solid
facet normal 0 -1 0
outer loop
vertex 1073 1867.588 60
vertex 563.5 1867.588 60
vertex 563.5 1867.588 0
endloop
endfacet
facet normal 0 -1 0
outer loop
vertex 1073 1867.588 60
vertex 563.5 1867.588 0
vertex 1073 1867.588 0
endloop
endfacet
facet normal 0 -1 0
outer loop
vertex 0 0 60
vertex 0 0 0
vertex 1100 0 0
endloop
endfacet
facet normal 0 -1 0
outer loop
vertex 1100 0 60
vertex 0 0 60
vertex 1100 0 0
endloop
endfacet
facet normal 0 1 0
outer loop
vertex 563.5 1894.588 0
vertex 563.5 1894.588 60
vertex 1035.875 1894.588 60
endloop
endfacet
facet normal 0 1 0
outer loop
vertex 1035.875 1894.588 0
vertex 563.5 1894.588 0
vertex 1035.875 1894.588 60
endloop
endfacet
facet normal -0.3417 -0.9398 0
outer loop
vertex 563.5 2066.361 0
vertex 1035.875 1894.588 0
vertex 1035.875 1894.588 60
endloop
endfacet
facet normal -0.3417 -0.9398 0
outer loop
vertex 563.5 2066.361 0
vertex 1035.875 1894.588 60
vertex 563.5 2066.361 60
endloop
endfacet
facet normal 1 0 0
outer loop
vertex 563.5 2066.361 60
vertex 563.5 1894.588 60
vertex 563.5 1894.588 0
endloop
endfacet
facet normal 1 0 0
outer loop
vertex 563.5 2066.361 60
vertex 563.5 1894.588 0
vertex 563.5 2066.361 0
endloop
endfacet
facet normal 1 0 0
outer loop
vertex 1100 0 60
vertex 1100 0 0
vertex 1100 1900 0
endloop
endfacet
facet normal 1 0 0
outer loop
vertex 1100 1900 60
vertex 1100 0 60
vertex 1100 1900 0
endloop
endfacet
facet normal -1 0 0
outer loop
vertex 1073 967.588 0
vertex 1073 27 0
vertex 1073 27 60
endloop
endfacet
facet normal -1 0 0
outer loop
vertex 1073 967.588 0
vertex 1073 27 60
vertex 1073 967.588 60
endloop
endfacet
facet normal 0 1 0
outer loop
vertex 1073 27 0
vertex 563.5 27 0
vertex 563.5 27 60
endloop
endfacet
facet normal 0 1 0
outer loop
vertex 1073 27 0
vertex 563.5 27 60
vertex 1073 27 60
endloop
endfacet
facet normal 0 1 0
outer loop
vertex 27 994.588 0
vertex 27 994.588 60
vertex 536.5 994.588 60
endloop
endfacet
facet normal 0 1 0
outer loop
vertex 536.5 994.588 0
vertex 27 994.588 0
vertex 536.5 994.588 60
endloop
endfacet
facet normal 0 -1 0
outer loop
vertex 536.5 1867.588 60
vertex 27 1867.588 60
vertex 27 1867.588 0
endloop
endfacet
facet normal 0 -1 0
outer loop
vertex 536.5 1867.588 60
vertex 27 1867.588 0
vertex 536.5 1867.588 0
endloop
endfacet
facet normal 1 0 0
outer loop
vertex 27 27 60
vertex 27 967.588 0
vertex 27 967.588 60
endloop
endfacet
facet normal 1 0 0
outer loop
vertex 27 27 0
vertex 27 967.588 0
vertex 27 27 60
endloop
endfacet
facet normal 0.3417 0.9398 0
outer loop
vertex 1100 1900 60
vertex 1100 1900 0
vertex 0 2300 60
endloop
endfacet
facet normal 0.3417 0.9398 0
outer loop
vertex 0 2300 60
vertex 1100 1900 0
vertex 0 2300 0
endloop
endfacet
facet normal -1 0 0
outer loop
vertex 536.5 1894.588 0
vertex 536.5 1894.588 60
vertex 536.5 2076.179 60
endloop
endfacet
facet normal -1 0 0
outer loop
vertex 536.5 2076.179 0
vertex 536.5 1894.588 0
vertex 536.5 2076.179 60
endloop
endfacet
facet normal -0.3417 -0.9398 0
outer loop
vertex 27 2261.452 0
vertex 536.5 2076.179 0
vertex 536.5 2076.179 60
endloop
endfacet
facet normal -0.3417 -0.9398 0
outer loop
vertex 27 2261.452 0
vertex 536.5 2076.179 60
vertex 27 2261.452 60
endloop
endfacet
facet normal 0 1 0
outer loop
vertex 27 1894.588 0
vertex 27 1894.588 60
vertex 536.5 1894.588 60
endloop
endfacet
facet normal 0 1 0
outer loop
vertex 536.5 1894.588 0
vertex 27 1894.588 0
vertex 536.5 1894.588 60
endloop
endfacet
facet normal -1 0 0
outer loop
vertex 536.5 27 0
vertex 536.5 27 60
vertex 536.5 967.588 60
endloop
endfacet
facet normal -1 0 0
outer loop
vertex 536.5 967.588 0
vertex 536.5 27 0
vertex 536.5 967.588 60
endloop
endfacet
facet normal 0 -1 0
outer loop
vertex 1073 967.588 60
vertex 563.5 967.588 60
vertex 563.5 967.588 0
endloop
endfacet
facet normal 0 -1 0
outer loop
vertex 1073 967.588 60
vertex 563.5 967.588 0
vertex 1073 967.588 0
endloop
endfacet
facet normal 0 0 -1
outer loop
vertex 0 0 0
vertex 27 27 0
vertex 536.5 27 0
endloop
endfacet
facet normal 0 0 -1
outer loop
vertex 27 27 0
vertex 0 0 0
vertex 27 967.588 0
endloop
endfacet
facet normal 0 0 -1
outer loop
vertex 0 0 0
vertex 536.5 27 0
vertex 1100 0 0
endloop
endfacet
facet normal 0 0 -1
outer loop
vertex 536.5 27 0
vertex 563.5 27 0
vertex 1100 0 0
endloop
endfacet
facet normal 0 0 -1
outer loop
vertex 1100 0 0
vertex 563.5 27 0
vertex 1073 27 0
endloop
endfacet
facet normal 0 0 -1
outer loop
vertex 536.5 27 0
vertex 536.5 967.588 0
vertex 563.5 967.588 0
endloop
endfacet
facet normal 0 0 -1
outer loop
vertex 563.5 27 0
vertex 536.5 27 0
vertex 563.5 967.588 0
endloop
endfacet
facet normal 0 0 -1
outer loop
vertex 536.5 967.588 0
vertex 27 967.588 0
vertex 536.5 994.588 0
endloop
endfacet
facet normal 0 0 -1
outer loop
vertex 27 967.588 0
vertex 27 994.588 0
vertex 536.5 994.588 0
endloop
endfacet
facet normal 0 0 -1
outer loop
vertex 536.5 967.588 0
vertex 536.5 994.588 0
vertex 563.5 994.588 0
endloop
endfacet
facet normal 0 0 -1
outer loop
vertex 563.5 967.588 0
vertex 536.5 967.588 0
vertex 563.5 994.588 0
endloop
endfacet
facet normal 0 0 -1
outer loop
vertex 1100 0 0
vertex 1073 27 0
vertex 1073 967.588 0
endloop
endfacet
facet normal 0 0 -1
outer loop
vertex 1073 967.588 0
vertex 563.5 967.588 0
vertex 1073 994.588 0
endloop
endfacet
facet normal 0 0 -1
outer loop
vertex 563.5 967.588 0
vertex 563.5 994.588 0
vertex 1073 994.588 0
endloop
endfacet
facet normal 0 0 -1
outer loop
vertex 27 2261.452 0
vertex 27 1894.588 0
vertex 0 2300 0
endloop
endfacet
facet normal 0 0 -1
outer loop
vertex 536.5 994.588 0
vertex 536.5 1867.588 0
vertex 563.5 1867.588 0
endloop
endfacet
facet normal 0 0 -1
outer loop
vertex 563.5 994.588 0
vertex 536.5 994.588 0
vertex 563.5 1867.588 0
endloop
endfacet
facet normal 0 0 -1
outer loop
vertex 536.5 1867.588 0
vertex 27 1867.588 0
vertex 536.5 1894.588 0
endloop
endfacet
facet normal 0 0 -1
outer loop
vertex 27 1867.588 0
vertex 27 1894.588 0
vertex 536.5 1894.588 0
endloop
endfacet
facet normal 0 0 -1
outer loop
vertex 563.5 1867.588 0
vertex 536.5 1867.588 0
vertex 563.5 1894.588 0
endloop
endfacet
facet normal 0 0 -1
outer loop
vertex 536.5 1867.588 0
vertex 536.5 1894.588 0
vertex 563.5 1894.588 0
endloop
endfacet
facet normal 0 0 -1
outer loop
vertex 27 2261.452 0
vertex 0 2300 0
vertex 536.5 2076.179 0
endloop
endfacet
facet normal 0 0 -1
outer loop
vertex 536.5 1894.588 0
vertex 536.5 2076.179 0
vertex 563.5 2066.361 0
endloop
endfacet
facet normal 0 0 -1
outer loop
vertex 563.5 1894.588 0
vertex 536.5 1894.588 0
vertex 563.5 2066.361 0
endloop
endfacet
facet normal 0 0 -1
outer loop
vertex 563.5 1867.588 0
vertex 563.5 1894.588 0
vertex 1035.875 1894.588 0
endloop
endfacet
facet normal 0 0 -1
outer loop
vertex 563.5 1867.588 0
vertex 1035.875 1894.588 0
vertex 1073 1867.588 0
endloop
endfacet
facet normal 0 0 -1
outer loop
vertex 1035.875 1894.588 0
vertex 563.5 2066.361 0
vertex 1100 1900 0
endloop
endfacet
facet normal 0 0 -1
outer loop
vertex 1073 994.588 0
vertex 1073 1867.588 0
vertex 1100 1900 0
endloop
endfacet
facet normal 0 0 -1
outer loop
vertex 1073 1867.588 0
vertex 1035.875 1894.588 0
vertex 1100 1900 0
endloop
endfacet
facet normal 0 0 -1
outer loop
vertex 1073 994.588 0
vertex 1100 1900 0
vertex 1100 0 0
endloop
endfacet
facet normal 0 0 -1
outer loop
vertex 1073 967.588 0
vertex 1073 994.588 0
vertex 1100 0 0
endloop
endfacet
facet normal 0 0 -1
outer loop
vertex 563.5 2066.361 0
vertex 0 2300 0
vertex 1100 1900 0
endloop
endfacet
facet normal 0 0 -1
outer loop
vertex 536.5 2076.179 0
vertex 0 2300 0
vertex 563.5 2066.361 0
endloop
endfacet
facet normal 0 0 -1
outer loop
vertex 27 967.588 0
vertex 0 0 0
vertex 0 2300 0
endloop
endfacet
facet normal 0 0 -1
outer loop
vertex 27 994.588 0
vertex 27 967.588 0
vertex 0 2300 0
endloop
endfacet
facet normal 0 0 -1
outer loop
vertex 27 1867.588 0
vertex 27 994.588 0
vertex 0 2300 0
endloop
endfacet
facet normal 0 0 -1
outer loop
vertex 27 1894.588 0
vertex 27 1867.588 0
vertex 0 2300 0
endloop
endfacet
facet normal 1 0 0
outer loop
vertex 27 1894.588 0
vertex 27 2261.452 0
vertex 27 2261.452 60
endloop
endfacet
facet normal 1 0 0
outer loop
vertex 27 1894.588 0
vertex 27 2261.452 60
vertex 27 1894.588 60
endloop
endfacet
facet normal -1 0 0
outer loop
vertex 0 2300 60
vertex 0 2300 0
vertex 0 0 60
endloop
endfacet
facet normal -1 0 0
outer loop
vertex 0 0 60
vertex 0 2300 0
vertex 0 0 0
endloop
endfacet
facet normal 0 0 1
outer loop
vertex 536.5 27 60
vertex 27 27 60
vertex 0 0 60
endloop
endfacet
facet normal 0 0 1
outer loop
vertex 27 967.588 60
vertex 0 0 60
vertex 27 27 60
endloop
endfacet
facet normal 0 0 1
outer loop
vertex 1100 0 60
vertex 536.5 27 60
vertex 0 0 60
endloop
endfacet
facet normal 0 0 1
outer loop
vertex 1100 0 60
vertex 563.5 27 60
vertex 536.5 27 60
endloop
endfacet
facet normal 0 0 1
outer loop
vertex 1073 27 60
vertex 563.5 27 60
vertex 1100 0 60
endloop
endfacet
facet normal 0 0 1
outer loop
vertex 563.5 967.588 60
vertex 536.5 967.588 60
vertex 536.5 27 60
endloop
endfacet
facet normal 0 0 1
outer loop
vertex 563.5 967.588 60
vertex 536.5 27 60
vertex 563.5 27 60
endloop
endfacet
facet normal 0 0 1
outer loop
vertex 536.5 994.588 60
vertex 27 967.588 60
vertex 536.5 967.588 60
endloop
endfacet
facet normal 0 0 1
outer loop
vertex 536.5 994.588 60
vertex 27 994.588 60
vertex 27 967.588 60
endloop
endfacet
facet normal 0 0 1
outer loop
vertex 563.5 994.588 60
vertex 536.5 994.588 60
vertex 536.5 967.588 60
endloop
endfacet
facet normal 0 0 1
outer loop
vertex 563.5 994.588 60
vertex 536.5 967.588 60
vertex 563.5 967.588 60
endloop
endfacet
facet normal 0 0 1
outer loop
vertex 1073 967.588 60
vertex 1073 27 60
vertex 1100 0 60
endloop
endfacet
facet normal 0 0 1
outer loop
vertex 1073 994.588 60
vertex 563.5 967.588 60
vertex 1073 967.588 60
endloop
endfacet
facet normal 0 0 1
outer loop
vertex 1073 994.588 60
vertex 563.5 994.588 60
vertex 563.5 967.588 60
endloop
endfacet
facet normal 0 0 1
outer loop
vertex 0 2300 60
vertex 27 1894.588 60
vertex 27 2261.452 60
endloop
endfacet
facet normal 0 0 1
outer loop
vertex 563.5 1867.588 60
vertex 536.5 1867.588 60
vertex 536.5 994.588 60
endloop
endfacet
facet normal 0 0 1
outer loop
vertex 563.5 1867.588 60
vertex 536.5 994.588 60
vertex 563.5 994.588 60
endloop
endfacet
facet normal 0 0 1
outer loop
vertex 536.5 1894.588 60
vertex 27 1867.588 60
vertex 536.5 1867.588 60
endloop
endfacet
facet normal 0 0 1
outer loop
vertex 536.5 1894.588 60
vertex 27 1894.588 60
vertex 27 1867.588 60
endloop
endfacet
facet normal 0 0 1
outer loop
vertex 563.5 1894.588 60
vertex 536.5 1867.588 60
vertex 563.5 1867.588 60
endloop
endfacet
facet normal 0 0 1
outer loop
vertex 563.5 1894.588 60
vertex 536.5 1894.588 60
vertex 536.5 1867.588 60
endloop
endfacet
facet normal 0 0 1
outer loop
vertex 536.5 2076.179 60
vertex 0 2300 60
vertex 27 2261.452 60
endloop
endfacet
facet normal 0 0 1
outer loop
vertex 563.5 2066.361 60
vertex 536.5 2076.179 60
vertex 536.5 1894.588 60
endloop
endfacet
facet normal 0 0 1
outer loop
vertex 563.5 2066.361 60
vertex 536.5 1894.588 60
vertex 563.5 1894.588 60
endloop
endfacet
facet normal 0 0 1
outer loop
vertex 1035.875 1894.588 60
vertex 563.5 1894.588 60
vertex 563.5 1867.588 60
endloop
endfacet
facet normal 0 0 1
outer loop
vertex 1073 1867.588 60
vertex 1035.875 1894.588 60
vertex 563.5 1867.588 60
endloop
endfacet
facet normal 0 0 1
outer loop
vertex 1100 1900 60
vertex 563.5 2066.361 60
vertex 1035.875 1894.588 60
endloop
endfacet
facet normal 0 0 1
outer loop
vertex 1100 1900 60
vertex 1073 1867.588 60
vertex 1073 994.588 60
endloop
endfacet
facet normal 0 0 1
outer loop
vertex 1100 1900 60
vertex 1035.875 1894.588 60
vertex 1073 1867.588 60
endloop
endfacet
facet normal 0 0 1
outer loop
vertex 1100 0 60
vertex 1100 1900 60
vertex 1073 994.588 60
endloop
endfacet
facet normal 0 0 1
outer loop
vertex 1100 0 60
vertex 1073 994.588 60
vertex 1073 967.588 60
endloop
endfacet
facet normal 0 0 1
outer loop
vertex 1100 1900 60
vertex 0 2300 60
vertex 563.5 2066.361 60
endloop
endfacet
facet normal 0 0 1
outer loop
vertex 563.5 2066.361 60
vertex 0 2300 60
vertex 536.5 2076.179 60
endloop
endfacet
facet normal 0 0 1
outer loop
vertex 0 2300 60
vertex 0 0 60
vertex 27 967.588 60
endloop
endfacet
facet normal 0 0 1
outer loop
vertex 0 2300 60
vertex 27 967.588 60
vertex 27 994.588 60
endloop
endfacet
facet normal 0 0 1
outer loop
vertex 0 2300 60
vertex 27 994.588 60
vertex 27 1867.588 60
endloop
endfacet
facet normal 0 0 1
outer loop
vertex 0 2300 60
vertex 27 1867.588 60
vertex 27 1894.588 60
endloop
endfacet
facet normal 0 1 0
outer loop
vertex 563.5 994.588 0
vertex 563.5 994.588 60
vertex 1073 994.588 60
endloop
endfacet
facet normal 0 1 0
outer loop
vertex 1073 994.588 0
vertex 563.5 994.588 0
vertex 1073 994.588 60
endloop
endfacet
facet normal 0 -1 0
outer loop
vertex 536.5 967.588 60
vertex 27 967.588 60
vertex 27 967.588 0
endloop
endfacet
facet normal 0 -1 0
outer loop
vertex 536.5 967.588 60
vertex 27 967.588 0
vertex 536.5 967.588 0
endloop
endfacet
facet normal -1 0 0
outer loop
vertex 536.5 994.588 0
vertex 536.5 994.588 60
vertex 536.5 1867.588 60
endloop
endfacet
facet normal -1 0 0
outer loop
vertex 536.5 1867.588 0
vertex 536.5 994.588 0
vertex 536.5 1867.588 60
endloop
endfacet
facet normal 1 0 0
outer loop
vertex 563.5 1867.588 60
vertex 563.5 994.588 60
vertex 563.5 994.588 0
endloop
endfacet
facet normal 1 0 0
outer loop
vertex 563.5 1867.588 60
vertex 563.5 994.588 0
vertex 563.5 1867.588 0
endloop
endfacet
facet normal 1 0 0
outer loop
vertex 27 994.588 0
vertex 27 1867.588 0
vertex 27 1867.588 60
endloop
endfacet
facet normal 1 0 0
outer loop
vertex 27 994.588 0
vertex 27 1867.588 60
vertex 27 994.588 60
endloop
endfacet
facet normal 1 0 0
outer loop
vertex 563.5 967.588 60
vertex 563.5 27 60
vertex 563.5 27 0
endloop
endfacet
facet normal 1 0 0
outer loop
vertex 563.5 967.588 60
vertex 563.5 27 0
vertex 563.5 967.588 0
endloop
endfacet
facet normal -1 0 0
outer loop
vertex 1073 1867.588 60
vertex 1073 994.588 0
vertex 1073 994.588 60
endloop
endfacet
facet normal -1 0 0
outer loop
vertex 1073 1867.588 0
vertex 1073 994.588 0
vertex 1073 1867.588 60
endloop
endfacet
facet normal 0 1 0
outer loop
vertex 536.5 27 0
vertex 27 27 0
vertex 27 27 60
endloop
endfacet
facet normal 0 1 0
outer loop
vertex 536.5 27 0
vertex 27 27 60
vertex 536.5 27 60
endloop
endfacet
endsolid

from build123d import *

# Parameters (mm, degrees)
BOSS_EXTRU_1_DEPTH = 60
ESQUISSE2_W        = 27
ESQUISSE2_H        = 2063
ESQUISSE2_W_2      = 1046
ESQUISSE2_H_2      = 27
EXTRU_MINCE1_DEPTH = 60


with BuildPart() as part:
    # Esquisse1 → Boss.-Extru.1 (new body)
    with BuildSketch(Plane.XY):
        Polygon((0, 0), (1100, 0), (1100, 1900), (0, 2300), align=None)
        Polygon((27, 27), (1073, 27), (1073, 1881.088463856), (27, 2261.452100219), align=None, mode=Mode.SUBTRACT)
    extrude(amount=BOSS_EXTRU_1_DEPTH)

    # Esquisse2 → Extru.-Mince1 (add)
    with BuildSketch(Plane.XY.offset(60)):
        with Locations((550, 1058.5)):
            Rectangle(ESQUISSE2_W, ESQUISSE2_H)
        with Locations((550, 1881.088463856)):
            Rectangle(ESQUISSE2_W_2, ESQUISSE2_H_2)
        with Locations((550, 981.088463856)):
            Rectangle(ESQUISSE2_W_2, ESQUISSE2_H_2)
    extrude(amount=-EXTRU_MINCE1_DEPTH)


solid = part.part
